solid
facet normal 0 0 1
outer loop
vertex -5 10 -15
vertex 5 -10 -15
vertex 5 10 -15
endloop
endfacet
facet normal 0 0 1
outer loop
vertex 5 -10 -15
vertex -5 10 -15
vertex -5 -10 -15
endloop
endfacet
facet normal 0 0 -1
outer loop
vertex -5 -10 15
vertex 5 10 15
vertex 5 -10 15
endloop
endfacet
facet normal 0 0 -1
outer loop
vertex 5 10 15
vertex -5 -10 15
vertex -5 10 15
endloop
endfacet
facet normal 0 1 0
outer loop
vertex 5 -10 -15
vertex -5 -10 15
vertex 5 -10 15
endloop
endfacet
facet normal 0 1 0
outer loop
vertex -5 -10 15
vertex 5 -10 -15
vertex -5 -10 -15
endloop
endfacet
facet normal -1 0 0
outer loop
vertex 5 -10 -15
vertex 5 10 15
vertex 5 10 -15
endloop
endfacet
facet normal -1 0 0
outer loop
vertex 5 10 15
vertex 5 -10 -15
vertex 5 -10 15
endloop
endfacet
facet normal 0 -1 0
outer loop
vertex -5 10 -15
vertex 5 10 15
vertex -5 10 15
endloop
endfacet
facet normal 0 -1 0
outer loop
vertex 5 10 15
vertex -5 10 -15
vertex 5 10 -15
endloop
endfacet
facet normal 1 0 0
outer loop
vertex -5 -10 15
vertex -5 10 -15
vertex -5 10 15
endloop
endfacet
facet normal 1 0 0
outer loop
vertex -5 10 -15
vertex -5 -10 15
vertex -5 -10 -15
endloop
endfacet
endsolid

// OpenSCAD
// 80 mm case fan -> 72 x 28 mm right-angle duct adapter
//
// Axis convention (matches request)
//   - Fan mounts to the flange in the XY plane at z = 0, air enters along +Z.
//   - The 90 degree turn is in the XZ plane, so the bend axis is Y.
//   - The 28 mm outlet side is parallel to that bend axis (Y).
//   - The 72 mm outlet side is the in-plane/radial dimension (Z at the outlet).
//   - Air exits along -X.
//
// The duct itself is one watertight polyhedron: outer skin + inner skin +
// annular caps. No boolean is needed to hollow it. The fan flange and outlet
// rim are simple CSG boxes added afterwards.

$fn = 64;

// ---------------- parameters ----------------
fan_hole_pitch = 71.5;   // standard 80 mm fan hole spacing
fan_hole_d     = 4.5;    // M4 clearance
fan_pad_r      = 6.5;    // corner pads so the M4 holes have material around them
fan_tie_w      = 6.0;    // zip-tie slot width
fan_tie_l      = 4.0;    // zip-tie slot length (1 mm web each side of flange)
fan_tie_pos    = 41.0;   // slot center distance from flange center
fan_tie_pair   = 9.0;    // ± offset of the two slots on each flange side

inlet_clear   = 76;      // clear square throat at fan
wall          = 2.0;     // duct wall thickness (5 perimeters at 0.4 mm nozzle)

flange_t      = 5;       // fan flange thickness
flange_outer  = 88;      // fan flange outer size

// M3 pilot holes for self-tapping screws in the fan corner pads (alternative
// to zip ties). Set to 0 to remove them.
fan_pilot_d       = 2.6;
fan_pilot_offset  = 4.8; // distance from M4 hole center, toward the flange edge

out_radial    = 72;      // outlet clear dim in bend plane (Z at outlet)
out_axis      = 28;      // outlet clear dim along bend axis (Y)
out_lip       = 10;      // straight run after arc

center_r      = 55;      // centerline bend radius
lead_in       = 12;      // vertical lead before arc
bend_angle    = 70;      // 90 - trim; stop 20 deg early -> min slope ~20 deg

rim_t         = 3;       // outlet rim thickness
rim_extra     = 9;       // rim overhang per side (gives 1.5 mm web around 6 mm slots)
rim_tie_pair_z = 14;     // ± Z offset of tie slots on the Y-side tabs
rim_tie_pair_y = 8;      // ± Y offset of tie slots on the Z-side tabs

n_straight    = 4;
n_bend        = 32;
n_out         = 4;
taper_exp     = 1.5;     // >1 keeps section large deeper into the bend

// ---------------- derived ----------------
in_half    = inlet_clear/2;
out_r_half = out_radial/2;
out_a_half = out_axis/2;

z_start   = flange_t - 1 + lead_in;   // arc start (duct overlaps flange)
th_end    = bend_angle * 3.14159265/180;
ce        = abs(cos(th_end)) < 1e-9 ? 0 : cos(th_end);  // snap avoids CGAL slivers at 90 deg
se        = abs(sin(th_end)) < 1e-9 ? 0 : sin(th_end);
arc_end_x = -center_r + center_r*ce;
arc_end_z = z_start + center_r*se;
outlet_x  = arc_end_x - out_lip*se;
outlet_z  = arc_end_z + out_lip*ce;
rim_rot   = 90 - bend_angle;          // rim frame rotation about Y

// ---------------- path ----------------
// Section = [cx, cz, nx, nz, half_radial, half_axis]
// (nx,nz) = in-plane radial unit vector; tangent = (-nz, nx).
function path_sections(n) = [
    for (i=[0:n])
    let (
        ns=n_straight, nb=n_bend, no=n_out,
        seg = i < ns ? 0 : (i < ns+nb ? 1 : 2),
        u   = seg==0 ? i/ns : (seg==1 ? (i-ns)/nb : (i-ns-nb)/no),
        th  = seg==0 ? 0 : (seg==1 ? u*bend_angle : bend_angle),
        cx  = seg==0 ? 0
            : seg==1 ? -center_r + center_r*cos(th)
            : arc_end_x - out_lip*se*u,
        cz  = seg==0 ? z_start - lead_in*(1-u)
            : seg==1 ? z_start + center_r*sin(th)
            : arc_end_z + out_lip*ce*u,
        nx  = seg==0 ? 1 : (seg==1 ? cos(th) : ce),
        nz  = seg==0 ? 0 : (seg==1 ? sin(th) : se),
        g   = pow(u_global(i,ns,nb,no,n), taper_exp),
        hr  = in_half + (out_r_half - in_half)*g,
        ha  = in_half + (out_a_half - in_half)*g
    )
    [cx, cz, nx, nz, hr, ha]
];

function u_global(i,ns,nb,no,n) = i/n;

function corner(s,a,b,off) =
    [ s[0] + s[2]*a*(s[4]+off),
      b*(s[5]+off),
      s[1] + s[3]*a*(s[4]+off) ];

function ring_verts(sec,off) = [
    for (s=sec) each [
        corner(s,-1,-1,off), corner(s, 1,-1,off),
        corner(s, 1, 1,off), corner(s,-1, 1,off)
    ]
];

// Explicit triangles: non-planar quads on a curved path are triangulated here
// instead of relying on polyhedron's internal triangulation.
function tri_quad(a,b,c,d) = [[a,b,c],[a,c,d]];
function tri_quad_rev(a,b,c,d) = [[a,c,b],[a,d,c]];

function outer_faces(nr) = [
    for (i=[0:nr-2], j=[0:3])
    let (a=4*i+j, b=4*i+(j+1)%4,
         c=4*(i+1)+(j+1)%4, d=4*(i+1)+j)
    each tri_quad(a,b,c,d)
];

function inner_faces(nr) = [
    for (i=[0:nr-2], j=[0:3])
    let (o=4*nr, a=o+4*i+j, b=o+4*i+(j+1)%4,
         c=o+4*(i+1)+(j+1)%4, d=o+4*(i+1)+j)
    each tri_quad_rev(a,b,c,d)
];

function cap_faces(nr) = [
    for (j=[0:3])
    let (j2=(j+1)%4, o=4*nr,
         last=4*(nr-1), olast=o+last)
    each concat(
        tri_quad(o+j, o+j2, j2, j),              // inlet annulus, normal -t
        tri_quad(last+j, last+j2, olast+j2, olast+j)  // outlet annulus, +t
    )
];

module hollow_duct(sec) {
    nr = len(sec);
    polyhedron(
        concat(ring_verts(sec, wall), ring_verts(sec, 0)),
        concat(outer_faces(nr), inner_faces(nr), cap_faces(nr)),
        convex=false
    );
}

// ---------------- flange and rim ----------------
module fan_flange_base() {
    // Flange plate with the square throat cut out. Pads are added afterwards
    // so the mounting holes at the corners have material around them.
    difference() {
        translate([0,0,flange_t/2])
            cube([flange_outer, flange_outer, flange_t], center=true);
        translate([0,0,-1])
            cube([inlet_clear, inlet_clear, flange_t+2], center=true);
    }
}

module fan_pads() {
    for (sx=[-1,1], sy=[-1,1])
        translate([sx*fan_hole_pitch/2, sy*fan_hole_pitch/2, flange_t/2])
            cylinder(r=fan_pad_r, h=flange_t, center=true);
}

module fan_tie_slots() {
    // Two slots on each edge of the flange, through its thickness.
    // Y-facing edges: slot long axis radial (Y).
    for (sy=[-1,1], dx=[-1,1])
        translate([dx*fan_tie_pair, sy*fan_tie_pos, flange_t/2])
            cube([fan_tie_w, fan_tie_l, flange_t+2], center=true);
    // X-facing edges: slot long axis radial (X).
    for (sx=[-1,1], dy=[-1,1])
        translate([sx*fan_tie_pos, dy*fan_tie_pair, flange_t/2])
            cube([fan_tie_l, fan_tie_w, flange_t+2], center=true);
}

module fan_holes() {
    p = fan_hole_pitch/2;
    for (sx=[-1,1], sy=[-1,1]) {
        // Standard M4 clearance hole.
        translate([sx*p, sy*p, -1])
            cylinder(d=fan_hole_d, h=flange_t+2);
        // Optional M3 self-tapping pilot, angled out toward the flange corner.
        if (fan_pilot_d > 0)
            translate([sx*(p + fan_pilot_offset/sqrt(2)),
                       sy*(p + fan_pilot_offset/sqrt(2)), -1])
                cylinder(d=fan_pilot_d, h=flange_t+2);
    }
}

module fan_flange() {
    difference() {
        union() {
            fan_flange_base();
            fan_pads();
        }
        fan_holes();
        fan_tie_slots();
    }
}

function rot_y_point(p,a) =
    [p[0]*cos(a)+p[2]*sin(a), p[1], -p[0]*sin(a)+p[2]*cos(a)];

function box_pts(c,d,a) = [
    for (p=[ [-1,-1,-1],[1,-1,-1],[1,1,-1],[-1,1,-1],
             [-1,-1,1],[1,-1,1],[1,1,1],[-1,1,1] ])
    let (q=rot_y_point([p[0]*d[0]/2, p[1]*d[1]/2, p[2]*d[2]/2], a))
    [c[0]+q[0], c[1]+q[1], c[2]+q[2]]
];

module obox(c,d,a) {
    polyhedron(box_pts(c,d,a),
        [[0,3,2,1],[4,5,6,7],[0,1,5,4],[1,2,6,5],[2,3,7,6],[3,0,4,7]],
        convex=true);
}

function rim_center(local_x) =
    let (q=rot_y_point([local_x,0,0], rim_rot))
    [outlet_x+q[0], 0, outlet_z+q[2]];

module outlet_rim() {
    ow = out_axis + 2*wall + 2*rim_extra;
    oh = out_radial + 2*wall + 2*rim_extra;
    difference() {
        obox(rim_center(-rim_t/2+0.5), [rim_t+1,ow,oh], rim_rot);
        obox(rim_center(-rim_t/2+0.5), [rim_t+3,out_axis,out_radial], rim_rot);
        ytab = out_axis/2 + wall + rim_extra/2;
        ztab = out_radial/2 + wall + rim_extra/2;
        xc = -rim_t + 0.5;
        for (sy=[-1,1], dz=[-1,1]) {
            q = rot_y_point([xc, sy*ytab, dz*rim_tie_pair_z], rim_rot);
            obox([outlet_x+q[0], q[1], outlet_z+q[2]],
                 [rim_t+3,fan_tie_w,fan_tie_l], rim_rot);
        }
        for (sz=[-1,1], dy=[-1,1]) {
            q = rot_y_point([xc, dy*rim_tie_pair_y, sz*ztab], rim_rot);
            obox([outlet_x+q[0], q[1], outlet_z+q[2]],
                 [rim_t+3,fan_tie_l,fan_tie_w], rim_rot);
        }
    }
}

module adapter() {
    union() {
        hollow_duct(path_sections(n_straight+n_bend+n_out));
        fan_flange();
        outlet_rim();
    }
}


obox([0,0,0],[10,20,30],0);
